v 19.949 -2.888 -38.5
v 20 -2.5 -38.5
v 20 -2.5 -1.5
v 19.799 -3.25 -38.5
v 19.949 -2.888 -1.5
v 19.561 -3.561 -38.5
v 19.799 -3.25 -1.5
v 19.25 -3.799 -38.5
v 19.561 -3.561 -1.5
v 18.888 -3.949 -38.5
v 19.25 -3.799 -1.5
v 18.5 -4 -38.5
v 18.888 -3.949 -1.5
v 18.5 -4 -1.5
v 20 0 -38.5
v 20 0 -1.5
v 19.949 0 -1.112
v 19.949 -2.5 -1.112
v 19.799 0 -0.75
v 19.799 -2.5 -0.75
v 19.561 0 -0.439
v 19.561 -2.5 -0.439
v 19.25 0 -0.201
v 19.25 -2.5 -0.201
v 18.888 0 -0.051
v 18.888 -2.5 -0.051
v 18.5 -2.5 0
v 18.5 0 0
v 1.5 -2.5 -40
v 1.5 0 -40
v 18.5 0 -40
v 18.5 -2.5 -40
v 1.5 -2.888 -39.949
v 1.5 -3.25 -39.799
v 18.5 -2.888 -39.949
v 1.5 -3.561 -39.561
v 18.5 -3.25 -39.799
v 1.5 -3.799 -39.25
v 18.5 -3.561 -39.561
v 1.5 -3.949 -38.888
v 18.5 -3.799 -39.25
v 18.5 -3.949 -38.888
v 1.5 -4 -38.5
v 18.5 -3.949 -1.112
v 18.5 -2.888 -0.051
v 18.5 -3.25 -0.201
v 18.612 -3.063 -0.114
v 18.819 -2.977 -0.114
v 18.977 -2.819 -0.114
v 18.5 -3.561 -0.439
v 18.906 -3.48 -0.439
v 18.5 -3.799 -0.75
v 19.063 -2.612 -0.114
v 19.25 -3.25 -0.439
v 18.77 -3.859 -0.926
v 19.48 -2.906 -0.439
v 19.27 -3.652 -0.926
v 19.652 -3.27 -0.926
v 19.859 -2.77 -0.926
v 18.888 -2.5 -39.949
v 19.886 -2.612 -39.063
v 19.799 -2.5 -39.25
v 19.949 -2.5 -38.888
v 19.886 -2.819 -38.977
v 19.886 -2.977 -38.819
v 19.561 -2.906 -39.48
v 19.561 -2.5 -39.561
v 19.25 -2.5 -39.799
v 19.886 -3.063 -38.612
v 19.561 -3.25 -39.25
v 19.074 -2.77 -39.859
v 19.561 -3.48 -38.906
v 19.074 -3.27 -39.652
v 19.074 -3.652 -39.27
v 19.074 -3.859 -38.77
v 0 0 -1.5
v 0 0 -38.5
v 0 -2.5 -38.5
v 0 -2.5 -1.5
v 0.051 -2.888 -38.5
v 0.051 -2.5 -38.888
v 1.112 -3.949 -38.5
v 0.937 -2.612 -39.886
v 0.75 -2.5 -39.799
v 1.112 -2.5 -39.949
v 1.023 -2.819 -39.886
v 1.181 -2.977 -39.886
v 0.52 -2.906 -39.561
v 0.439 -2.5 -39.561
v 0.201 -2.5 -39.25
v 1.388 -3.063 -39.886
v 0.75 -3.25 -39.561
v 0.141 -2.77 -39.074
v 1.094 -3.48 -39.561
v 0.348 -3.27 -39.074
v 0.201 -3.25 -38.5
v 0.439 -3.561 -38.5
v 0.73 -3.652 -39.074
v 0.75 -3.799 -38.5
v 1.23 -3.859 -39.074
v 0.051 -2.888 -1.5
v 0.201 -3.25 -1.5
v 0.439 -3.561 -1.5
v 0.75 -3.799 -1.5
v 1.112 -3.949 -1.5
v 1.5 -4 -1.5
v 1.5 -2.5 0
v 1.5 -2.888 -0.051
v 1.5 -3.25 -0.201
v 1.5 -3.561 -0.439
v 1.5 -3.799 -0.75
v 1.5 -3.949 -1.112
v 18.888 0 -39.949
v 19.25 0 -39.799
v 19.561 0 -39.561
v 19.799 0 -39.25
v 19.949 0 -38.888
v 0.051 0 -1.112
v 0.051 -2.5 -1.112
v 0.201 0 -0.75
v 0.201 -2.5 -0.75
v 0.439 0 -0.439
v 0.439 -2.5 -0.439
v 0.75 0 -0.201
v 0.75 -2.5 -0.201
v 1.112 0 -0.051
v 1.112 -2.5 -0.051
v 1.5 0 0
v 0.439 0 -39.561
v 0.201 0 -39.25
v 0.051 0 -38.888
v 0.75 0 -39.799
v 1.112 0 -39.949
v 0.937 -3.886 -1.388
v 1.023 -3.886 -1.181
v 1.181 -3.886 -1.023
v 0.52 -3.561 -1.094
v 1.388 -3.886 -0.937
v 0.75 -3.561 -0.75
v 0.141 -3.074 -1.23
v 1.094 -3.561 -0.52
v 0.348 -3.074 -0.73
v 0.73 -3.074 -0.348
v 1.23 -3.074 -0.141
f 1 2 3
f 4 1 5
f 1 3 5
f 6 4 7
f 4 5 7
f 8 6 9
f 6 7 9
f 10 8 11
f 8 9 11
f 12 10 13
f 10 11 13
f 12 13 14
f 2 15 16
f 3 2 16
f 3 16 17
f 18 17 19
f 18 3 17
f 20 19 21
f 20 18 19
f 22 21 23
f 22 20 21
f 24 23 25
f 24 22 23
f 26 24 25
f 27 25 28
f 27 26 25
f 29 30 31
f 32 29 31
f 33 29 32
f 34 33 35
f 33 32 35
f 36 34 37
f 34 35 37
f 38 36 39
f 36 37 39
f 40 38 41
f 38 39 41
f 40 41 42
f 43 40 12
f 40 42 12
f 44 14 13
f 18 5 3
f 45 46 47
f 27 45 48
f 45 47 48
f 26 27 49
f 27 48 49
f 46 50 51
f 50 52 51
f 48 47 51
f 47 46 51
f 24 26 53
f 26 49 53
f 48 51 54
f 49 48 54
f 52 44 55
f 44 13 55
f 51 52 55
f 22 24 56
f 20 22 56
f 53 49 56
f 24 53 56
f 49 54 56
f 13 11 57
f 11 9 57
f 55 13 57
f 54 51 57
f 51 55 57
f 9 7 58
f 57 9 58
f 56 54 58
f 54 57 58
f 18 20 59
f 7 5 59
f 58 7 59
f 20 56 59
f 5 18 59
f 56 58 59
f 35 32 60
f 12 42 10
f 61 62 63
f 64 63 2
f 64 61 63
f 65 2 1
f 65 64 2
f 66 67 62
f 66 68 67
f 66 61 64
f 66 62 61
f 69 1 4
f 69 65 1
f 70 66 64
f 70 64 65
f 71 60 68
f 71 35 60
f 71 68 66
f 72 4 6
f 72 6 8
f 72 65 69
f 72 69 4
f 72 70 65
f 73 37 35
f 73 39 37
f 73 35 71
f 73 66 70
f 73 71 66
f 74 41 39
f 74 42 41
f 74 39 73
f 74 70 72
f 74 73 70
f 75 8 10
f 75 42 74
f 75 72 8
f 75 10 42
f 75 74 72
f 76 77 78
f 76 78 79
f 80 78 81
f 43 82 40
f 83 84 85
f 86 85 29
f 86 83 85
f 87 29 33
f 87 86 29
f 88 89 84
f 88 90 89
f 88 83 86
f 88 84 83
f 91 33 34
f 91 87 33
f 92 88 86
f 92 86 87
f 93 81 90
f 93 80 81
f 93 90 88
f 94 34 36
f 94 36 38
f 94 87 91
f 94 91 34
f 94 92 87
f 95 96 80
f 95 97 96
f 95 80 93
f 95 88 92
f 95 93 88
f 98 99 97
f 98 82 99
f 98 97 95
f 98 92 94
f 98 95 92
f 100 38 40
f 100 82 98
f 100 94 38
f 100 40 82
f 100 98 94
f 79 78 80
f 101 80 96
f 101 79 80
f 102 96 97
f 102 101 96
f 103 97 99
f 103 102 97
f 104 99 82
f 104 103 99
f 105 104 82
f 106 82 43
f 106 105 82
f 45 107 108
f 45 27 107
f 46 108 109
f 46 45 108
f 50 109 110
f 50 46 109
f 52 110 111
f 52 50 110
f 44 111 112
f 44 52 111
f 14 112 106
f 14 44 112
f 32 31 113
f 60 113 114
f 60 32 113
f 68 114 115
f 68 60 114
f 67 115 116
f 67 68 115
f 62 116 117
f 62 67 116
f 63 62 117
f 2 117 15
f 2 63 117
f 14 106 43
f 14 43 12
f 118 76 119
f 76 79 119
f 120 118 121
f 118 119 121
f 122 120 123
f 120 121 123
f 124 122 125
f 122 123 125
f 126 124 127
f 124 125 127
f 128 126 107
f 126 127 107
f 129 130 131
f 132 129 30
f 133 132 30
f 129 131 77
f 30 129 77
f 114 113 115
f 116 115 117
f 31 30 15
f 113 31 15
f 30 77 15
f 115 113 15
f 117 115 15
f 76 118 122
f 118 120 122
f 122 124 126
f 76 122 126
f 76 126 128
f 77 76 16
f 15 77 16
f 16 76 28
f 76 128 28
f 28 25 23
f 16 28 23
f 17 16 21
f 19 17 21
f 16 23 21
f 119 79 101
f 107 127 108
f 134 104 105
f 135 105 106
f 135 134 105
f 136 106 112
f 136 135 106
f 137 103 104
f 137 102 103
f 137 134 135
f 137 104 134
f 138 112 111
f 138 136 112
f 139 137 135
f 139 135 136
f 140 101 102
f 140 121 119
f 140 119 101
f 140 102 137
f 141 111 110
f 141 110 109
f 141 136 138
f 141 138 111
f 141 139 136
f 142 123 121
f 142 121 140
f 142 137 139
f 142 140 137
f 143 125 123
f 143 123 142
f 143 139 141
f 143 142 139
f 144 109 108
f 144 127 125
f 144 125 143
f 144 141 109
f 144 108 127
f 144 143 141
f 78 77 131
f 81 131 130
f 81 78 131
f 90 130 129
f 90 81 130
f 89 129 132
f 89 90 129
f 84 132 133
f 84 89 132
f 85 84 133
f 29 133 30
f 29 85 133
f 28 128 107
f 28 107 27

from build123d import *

# Parameters (mm, degrees)
F0_W     = 20
F0_H     = 40
F0_R     = 2.5
F3_DEPTH = 4
F4_R     = 1.5


# Not quite as in the source:
# - the program builds the solid bodies; features that only make, move or delete a surface that nothing else refers to are left out


with BuildPart() as f3:
    # F0 (on Front) → F3 (new body)
    with BuildSketch(Plane.XZ):
        with Locations((10, -20)):
            Rectangle(F0_W, F0_H)
        with Locations((10, -29.9999993294)):
            Circle(F0_R, mode=Mode.SUBTRACT)
        with Locations((10, -10)):
            Circle(F0_R, mode=Mode.SUBTRACT)
        with Locations((10, -10)):
            Circle(F0_R)
        with Locations((10, -29.9999993294)):
            Circle(F0_R)
    extrude(amount=F3_DEPTH)

    # F4
    f4_edges = [f3.edges().sort_by_distance(p)[0] for p in [
        (0, -2, 0),
        (0, -4, -20),
        (0, -2, -40),
        (10, -4, -40),
        (20, -2, -40),
        (20, -4, -20),
        (10, -4, 0),
        (20, -2, 0),
    ]]
    fillet(f4_edges, radius=F4_R)


solid = f3.part
